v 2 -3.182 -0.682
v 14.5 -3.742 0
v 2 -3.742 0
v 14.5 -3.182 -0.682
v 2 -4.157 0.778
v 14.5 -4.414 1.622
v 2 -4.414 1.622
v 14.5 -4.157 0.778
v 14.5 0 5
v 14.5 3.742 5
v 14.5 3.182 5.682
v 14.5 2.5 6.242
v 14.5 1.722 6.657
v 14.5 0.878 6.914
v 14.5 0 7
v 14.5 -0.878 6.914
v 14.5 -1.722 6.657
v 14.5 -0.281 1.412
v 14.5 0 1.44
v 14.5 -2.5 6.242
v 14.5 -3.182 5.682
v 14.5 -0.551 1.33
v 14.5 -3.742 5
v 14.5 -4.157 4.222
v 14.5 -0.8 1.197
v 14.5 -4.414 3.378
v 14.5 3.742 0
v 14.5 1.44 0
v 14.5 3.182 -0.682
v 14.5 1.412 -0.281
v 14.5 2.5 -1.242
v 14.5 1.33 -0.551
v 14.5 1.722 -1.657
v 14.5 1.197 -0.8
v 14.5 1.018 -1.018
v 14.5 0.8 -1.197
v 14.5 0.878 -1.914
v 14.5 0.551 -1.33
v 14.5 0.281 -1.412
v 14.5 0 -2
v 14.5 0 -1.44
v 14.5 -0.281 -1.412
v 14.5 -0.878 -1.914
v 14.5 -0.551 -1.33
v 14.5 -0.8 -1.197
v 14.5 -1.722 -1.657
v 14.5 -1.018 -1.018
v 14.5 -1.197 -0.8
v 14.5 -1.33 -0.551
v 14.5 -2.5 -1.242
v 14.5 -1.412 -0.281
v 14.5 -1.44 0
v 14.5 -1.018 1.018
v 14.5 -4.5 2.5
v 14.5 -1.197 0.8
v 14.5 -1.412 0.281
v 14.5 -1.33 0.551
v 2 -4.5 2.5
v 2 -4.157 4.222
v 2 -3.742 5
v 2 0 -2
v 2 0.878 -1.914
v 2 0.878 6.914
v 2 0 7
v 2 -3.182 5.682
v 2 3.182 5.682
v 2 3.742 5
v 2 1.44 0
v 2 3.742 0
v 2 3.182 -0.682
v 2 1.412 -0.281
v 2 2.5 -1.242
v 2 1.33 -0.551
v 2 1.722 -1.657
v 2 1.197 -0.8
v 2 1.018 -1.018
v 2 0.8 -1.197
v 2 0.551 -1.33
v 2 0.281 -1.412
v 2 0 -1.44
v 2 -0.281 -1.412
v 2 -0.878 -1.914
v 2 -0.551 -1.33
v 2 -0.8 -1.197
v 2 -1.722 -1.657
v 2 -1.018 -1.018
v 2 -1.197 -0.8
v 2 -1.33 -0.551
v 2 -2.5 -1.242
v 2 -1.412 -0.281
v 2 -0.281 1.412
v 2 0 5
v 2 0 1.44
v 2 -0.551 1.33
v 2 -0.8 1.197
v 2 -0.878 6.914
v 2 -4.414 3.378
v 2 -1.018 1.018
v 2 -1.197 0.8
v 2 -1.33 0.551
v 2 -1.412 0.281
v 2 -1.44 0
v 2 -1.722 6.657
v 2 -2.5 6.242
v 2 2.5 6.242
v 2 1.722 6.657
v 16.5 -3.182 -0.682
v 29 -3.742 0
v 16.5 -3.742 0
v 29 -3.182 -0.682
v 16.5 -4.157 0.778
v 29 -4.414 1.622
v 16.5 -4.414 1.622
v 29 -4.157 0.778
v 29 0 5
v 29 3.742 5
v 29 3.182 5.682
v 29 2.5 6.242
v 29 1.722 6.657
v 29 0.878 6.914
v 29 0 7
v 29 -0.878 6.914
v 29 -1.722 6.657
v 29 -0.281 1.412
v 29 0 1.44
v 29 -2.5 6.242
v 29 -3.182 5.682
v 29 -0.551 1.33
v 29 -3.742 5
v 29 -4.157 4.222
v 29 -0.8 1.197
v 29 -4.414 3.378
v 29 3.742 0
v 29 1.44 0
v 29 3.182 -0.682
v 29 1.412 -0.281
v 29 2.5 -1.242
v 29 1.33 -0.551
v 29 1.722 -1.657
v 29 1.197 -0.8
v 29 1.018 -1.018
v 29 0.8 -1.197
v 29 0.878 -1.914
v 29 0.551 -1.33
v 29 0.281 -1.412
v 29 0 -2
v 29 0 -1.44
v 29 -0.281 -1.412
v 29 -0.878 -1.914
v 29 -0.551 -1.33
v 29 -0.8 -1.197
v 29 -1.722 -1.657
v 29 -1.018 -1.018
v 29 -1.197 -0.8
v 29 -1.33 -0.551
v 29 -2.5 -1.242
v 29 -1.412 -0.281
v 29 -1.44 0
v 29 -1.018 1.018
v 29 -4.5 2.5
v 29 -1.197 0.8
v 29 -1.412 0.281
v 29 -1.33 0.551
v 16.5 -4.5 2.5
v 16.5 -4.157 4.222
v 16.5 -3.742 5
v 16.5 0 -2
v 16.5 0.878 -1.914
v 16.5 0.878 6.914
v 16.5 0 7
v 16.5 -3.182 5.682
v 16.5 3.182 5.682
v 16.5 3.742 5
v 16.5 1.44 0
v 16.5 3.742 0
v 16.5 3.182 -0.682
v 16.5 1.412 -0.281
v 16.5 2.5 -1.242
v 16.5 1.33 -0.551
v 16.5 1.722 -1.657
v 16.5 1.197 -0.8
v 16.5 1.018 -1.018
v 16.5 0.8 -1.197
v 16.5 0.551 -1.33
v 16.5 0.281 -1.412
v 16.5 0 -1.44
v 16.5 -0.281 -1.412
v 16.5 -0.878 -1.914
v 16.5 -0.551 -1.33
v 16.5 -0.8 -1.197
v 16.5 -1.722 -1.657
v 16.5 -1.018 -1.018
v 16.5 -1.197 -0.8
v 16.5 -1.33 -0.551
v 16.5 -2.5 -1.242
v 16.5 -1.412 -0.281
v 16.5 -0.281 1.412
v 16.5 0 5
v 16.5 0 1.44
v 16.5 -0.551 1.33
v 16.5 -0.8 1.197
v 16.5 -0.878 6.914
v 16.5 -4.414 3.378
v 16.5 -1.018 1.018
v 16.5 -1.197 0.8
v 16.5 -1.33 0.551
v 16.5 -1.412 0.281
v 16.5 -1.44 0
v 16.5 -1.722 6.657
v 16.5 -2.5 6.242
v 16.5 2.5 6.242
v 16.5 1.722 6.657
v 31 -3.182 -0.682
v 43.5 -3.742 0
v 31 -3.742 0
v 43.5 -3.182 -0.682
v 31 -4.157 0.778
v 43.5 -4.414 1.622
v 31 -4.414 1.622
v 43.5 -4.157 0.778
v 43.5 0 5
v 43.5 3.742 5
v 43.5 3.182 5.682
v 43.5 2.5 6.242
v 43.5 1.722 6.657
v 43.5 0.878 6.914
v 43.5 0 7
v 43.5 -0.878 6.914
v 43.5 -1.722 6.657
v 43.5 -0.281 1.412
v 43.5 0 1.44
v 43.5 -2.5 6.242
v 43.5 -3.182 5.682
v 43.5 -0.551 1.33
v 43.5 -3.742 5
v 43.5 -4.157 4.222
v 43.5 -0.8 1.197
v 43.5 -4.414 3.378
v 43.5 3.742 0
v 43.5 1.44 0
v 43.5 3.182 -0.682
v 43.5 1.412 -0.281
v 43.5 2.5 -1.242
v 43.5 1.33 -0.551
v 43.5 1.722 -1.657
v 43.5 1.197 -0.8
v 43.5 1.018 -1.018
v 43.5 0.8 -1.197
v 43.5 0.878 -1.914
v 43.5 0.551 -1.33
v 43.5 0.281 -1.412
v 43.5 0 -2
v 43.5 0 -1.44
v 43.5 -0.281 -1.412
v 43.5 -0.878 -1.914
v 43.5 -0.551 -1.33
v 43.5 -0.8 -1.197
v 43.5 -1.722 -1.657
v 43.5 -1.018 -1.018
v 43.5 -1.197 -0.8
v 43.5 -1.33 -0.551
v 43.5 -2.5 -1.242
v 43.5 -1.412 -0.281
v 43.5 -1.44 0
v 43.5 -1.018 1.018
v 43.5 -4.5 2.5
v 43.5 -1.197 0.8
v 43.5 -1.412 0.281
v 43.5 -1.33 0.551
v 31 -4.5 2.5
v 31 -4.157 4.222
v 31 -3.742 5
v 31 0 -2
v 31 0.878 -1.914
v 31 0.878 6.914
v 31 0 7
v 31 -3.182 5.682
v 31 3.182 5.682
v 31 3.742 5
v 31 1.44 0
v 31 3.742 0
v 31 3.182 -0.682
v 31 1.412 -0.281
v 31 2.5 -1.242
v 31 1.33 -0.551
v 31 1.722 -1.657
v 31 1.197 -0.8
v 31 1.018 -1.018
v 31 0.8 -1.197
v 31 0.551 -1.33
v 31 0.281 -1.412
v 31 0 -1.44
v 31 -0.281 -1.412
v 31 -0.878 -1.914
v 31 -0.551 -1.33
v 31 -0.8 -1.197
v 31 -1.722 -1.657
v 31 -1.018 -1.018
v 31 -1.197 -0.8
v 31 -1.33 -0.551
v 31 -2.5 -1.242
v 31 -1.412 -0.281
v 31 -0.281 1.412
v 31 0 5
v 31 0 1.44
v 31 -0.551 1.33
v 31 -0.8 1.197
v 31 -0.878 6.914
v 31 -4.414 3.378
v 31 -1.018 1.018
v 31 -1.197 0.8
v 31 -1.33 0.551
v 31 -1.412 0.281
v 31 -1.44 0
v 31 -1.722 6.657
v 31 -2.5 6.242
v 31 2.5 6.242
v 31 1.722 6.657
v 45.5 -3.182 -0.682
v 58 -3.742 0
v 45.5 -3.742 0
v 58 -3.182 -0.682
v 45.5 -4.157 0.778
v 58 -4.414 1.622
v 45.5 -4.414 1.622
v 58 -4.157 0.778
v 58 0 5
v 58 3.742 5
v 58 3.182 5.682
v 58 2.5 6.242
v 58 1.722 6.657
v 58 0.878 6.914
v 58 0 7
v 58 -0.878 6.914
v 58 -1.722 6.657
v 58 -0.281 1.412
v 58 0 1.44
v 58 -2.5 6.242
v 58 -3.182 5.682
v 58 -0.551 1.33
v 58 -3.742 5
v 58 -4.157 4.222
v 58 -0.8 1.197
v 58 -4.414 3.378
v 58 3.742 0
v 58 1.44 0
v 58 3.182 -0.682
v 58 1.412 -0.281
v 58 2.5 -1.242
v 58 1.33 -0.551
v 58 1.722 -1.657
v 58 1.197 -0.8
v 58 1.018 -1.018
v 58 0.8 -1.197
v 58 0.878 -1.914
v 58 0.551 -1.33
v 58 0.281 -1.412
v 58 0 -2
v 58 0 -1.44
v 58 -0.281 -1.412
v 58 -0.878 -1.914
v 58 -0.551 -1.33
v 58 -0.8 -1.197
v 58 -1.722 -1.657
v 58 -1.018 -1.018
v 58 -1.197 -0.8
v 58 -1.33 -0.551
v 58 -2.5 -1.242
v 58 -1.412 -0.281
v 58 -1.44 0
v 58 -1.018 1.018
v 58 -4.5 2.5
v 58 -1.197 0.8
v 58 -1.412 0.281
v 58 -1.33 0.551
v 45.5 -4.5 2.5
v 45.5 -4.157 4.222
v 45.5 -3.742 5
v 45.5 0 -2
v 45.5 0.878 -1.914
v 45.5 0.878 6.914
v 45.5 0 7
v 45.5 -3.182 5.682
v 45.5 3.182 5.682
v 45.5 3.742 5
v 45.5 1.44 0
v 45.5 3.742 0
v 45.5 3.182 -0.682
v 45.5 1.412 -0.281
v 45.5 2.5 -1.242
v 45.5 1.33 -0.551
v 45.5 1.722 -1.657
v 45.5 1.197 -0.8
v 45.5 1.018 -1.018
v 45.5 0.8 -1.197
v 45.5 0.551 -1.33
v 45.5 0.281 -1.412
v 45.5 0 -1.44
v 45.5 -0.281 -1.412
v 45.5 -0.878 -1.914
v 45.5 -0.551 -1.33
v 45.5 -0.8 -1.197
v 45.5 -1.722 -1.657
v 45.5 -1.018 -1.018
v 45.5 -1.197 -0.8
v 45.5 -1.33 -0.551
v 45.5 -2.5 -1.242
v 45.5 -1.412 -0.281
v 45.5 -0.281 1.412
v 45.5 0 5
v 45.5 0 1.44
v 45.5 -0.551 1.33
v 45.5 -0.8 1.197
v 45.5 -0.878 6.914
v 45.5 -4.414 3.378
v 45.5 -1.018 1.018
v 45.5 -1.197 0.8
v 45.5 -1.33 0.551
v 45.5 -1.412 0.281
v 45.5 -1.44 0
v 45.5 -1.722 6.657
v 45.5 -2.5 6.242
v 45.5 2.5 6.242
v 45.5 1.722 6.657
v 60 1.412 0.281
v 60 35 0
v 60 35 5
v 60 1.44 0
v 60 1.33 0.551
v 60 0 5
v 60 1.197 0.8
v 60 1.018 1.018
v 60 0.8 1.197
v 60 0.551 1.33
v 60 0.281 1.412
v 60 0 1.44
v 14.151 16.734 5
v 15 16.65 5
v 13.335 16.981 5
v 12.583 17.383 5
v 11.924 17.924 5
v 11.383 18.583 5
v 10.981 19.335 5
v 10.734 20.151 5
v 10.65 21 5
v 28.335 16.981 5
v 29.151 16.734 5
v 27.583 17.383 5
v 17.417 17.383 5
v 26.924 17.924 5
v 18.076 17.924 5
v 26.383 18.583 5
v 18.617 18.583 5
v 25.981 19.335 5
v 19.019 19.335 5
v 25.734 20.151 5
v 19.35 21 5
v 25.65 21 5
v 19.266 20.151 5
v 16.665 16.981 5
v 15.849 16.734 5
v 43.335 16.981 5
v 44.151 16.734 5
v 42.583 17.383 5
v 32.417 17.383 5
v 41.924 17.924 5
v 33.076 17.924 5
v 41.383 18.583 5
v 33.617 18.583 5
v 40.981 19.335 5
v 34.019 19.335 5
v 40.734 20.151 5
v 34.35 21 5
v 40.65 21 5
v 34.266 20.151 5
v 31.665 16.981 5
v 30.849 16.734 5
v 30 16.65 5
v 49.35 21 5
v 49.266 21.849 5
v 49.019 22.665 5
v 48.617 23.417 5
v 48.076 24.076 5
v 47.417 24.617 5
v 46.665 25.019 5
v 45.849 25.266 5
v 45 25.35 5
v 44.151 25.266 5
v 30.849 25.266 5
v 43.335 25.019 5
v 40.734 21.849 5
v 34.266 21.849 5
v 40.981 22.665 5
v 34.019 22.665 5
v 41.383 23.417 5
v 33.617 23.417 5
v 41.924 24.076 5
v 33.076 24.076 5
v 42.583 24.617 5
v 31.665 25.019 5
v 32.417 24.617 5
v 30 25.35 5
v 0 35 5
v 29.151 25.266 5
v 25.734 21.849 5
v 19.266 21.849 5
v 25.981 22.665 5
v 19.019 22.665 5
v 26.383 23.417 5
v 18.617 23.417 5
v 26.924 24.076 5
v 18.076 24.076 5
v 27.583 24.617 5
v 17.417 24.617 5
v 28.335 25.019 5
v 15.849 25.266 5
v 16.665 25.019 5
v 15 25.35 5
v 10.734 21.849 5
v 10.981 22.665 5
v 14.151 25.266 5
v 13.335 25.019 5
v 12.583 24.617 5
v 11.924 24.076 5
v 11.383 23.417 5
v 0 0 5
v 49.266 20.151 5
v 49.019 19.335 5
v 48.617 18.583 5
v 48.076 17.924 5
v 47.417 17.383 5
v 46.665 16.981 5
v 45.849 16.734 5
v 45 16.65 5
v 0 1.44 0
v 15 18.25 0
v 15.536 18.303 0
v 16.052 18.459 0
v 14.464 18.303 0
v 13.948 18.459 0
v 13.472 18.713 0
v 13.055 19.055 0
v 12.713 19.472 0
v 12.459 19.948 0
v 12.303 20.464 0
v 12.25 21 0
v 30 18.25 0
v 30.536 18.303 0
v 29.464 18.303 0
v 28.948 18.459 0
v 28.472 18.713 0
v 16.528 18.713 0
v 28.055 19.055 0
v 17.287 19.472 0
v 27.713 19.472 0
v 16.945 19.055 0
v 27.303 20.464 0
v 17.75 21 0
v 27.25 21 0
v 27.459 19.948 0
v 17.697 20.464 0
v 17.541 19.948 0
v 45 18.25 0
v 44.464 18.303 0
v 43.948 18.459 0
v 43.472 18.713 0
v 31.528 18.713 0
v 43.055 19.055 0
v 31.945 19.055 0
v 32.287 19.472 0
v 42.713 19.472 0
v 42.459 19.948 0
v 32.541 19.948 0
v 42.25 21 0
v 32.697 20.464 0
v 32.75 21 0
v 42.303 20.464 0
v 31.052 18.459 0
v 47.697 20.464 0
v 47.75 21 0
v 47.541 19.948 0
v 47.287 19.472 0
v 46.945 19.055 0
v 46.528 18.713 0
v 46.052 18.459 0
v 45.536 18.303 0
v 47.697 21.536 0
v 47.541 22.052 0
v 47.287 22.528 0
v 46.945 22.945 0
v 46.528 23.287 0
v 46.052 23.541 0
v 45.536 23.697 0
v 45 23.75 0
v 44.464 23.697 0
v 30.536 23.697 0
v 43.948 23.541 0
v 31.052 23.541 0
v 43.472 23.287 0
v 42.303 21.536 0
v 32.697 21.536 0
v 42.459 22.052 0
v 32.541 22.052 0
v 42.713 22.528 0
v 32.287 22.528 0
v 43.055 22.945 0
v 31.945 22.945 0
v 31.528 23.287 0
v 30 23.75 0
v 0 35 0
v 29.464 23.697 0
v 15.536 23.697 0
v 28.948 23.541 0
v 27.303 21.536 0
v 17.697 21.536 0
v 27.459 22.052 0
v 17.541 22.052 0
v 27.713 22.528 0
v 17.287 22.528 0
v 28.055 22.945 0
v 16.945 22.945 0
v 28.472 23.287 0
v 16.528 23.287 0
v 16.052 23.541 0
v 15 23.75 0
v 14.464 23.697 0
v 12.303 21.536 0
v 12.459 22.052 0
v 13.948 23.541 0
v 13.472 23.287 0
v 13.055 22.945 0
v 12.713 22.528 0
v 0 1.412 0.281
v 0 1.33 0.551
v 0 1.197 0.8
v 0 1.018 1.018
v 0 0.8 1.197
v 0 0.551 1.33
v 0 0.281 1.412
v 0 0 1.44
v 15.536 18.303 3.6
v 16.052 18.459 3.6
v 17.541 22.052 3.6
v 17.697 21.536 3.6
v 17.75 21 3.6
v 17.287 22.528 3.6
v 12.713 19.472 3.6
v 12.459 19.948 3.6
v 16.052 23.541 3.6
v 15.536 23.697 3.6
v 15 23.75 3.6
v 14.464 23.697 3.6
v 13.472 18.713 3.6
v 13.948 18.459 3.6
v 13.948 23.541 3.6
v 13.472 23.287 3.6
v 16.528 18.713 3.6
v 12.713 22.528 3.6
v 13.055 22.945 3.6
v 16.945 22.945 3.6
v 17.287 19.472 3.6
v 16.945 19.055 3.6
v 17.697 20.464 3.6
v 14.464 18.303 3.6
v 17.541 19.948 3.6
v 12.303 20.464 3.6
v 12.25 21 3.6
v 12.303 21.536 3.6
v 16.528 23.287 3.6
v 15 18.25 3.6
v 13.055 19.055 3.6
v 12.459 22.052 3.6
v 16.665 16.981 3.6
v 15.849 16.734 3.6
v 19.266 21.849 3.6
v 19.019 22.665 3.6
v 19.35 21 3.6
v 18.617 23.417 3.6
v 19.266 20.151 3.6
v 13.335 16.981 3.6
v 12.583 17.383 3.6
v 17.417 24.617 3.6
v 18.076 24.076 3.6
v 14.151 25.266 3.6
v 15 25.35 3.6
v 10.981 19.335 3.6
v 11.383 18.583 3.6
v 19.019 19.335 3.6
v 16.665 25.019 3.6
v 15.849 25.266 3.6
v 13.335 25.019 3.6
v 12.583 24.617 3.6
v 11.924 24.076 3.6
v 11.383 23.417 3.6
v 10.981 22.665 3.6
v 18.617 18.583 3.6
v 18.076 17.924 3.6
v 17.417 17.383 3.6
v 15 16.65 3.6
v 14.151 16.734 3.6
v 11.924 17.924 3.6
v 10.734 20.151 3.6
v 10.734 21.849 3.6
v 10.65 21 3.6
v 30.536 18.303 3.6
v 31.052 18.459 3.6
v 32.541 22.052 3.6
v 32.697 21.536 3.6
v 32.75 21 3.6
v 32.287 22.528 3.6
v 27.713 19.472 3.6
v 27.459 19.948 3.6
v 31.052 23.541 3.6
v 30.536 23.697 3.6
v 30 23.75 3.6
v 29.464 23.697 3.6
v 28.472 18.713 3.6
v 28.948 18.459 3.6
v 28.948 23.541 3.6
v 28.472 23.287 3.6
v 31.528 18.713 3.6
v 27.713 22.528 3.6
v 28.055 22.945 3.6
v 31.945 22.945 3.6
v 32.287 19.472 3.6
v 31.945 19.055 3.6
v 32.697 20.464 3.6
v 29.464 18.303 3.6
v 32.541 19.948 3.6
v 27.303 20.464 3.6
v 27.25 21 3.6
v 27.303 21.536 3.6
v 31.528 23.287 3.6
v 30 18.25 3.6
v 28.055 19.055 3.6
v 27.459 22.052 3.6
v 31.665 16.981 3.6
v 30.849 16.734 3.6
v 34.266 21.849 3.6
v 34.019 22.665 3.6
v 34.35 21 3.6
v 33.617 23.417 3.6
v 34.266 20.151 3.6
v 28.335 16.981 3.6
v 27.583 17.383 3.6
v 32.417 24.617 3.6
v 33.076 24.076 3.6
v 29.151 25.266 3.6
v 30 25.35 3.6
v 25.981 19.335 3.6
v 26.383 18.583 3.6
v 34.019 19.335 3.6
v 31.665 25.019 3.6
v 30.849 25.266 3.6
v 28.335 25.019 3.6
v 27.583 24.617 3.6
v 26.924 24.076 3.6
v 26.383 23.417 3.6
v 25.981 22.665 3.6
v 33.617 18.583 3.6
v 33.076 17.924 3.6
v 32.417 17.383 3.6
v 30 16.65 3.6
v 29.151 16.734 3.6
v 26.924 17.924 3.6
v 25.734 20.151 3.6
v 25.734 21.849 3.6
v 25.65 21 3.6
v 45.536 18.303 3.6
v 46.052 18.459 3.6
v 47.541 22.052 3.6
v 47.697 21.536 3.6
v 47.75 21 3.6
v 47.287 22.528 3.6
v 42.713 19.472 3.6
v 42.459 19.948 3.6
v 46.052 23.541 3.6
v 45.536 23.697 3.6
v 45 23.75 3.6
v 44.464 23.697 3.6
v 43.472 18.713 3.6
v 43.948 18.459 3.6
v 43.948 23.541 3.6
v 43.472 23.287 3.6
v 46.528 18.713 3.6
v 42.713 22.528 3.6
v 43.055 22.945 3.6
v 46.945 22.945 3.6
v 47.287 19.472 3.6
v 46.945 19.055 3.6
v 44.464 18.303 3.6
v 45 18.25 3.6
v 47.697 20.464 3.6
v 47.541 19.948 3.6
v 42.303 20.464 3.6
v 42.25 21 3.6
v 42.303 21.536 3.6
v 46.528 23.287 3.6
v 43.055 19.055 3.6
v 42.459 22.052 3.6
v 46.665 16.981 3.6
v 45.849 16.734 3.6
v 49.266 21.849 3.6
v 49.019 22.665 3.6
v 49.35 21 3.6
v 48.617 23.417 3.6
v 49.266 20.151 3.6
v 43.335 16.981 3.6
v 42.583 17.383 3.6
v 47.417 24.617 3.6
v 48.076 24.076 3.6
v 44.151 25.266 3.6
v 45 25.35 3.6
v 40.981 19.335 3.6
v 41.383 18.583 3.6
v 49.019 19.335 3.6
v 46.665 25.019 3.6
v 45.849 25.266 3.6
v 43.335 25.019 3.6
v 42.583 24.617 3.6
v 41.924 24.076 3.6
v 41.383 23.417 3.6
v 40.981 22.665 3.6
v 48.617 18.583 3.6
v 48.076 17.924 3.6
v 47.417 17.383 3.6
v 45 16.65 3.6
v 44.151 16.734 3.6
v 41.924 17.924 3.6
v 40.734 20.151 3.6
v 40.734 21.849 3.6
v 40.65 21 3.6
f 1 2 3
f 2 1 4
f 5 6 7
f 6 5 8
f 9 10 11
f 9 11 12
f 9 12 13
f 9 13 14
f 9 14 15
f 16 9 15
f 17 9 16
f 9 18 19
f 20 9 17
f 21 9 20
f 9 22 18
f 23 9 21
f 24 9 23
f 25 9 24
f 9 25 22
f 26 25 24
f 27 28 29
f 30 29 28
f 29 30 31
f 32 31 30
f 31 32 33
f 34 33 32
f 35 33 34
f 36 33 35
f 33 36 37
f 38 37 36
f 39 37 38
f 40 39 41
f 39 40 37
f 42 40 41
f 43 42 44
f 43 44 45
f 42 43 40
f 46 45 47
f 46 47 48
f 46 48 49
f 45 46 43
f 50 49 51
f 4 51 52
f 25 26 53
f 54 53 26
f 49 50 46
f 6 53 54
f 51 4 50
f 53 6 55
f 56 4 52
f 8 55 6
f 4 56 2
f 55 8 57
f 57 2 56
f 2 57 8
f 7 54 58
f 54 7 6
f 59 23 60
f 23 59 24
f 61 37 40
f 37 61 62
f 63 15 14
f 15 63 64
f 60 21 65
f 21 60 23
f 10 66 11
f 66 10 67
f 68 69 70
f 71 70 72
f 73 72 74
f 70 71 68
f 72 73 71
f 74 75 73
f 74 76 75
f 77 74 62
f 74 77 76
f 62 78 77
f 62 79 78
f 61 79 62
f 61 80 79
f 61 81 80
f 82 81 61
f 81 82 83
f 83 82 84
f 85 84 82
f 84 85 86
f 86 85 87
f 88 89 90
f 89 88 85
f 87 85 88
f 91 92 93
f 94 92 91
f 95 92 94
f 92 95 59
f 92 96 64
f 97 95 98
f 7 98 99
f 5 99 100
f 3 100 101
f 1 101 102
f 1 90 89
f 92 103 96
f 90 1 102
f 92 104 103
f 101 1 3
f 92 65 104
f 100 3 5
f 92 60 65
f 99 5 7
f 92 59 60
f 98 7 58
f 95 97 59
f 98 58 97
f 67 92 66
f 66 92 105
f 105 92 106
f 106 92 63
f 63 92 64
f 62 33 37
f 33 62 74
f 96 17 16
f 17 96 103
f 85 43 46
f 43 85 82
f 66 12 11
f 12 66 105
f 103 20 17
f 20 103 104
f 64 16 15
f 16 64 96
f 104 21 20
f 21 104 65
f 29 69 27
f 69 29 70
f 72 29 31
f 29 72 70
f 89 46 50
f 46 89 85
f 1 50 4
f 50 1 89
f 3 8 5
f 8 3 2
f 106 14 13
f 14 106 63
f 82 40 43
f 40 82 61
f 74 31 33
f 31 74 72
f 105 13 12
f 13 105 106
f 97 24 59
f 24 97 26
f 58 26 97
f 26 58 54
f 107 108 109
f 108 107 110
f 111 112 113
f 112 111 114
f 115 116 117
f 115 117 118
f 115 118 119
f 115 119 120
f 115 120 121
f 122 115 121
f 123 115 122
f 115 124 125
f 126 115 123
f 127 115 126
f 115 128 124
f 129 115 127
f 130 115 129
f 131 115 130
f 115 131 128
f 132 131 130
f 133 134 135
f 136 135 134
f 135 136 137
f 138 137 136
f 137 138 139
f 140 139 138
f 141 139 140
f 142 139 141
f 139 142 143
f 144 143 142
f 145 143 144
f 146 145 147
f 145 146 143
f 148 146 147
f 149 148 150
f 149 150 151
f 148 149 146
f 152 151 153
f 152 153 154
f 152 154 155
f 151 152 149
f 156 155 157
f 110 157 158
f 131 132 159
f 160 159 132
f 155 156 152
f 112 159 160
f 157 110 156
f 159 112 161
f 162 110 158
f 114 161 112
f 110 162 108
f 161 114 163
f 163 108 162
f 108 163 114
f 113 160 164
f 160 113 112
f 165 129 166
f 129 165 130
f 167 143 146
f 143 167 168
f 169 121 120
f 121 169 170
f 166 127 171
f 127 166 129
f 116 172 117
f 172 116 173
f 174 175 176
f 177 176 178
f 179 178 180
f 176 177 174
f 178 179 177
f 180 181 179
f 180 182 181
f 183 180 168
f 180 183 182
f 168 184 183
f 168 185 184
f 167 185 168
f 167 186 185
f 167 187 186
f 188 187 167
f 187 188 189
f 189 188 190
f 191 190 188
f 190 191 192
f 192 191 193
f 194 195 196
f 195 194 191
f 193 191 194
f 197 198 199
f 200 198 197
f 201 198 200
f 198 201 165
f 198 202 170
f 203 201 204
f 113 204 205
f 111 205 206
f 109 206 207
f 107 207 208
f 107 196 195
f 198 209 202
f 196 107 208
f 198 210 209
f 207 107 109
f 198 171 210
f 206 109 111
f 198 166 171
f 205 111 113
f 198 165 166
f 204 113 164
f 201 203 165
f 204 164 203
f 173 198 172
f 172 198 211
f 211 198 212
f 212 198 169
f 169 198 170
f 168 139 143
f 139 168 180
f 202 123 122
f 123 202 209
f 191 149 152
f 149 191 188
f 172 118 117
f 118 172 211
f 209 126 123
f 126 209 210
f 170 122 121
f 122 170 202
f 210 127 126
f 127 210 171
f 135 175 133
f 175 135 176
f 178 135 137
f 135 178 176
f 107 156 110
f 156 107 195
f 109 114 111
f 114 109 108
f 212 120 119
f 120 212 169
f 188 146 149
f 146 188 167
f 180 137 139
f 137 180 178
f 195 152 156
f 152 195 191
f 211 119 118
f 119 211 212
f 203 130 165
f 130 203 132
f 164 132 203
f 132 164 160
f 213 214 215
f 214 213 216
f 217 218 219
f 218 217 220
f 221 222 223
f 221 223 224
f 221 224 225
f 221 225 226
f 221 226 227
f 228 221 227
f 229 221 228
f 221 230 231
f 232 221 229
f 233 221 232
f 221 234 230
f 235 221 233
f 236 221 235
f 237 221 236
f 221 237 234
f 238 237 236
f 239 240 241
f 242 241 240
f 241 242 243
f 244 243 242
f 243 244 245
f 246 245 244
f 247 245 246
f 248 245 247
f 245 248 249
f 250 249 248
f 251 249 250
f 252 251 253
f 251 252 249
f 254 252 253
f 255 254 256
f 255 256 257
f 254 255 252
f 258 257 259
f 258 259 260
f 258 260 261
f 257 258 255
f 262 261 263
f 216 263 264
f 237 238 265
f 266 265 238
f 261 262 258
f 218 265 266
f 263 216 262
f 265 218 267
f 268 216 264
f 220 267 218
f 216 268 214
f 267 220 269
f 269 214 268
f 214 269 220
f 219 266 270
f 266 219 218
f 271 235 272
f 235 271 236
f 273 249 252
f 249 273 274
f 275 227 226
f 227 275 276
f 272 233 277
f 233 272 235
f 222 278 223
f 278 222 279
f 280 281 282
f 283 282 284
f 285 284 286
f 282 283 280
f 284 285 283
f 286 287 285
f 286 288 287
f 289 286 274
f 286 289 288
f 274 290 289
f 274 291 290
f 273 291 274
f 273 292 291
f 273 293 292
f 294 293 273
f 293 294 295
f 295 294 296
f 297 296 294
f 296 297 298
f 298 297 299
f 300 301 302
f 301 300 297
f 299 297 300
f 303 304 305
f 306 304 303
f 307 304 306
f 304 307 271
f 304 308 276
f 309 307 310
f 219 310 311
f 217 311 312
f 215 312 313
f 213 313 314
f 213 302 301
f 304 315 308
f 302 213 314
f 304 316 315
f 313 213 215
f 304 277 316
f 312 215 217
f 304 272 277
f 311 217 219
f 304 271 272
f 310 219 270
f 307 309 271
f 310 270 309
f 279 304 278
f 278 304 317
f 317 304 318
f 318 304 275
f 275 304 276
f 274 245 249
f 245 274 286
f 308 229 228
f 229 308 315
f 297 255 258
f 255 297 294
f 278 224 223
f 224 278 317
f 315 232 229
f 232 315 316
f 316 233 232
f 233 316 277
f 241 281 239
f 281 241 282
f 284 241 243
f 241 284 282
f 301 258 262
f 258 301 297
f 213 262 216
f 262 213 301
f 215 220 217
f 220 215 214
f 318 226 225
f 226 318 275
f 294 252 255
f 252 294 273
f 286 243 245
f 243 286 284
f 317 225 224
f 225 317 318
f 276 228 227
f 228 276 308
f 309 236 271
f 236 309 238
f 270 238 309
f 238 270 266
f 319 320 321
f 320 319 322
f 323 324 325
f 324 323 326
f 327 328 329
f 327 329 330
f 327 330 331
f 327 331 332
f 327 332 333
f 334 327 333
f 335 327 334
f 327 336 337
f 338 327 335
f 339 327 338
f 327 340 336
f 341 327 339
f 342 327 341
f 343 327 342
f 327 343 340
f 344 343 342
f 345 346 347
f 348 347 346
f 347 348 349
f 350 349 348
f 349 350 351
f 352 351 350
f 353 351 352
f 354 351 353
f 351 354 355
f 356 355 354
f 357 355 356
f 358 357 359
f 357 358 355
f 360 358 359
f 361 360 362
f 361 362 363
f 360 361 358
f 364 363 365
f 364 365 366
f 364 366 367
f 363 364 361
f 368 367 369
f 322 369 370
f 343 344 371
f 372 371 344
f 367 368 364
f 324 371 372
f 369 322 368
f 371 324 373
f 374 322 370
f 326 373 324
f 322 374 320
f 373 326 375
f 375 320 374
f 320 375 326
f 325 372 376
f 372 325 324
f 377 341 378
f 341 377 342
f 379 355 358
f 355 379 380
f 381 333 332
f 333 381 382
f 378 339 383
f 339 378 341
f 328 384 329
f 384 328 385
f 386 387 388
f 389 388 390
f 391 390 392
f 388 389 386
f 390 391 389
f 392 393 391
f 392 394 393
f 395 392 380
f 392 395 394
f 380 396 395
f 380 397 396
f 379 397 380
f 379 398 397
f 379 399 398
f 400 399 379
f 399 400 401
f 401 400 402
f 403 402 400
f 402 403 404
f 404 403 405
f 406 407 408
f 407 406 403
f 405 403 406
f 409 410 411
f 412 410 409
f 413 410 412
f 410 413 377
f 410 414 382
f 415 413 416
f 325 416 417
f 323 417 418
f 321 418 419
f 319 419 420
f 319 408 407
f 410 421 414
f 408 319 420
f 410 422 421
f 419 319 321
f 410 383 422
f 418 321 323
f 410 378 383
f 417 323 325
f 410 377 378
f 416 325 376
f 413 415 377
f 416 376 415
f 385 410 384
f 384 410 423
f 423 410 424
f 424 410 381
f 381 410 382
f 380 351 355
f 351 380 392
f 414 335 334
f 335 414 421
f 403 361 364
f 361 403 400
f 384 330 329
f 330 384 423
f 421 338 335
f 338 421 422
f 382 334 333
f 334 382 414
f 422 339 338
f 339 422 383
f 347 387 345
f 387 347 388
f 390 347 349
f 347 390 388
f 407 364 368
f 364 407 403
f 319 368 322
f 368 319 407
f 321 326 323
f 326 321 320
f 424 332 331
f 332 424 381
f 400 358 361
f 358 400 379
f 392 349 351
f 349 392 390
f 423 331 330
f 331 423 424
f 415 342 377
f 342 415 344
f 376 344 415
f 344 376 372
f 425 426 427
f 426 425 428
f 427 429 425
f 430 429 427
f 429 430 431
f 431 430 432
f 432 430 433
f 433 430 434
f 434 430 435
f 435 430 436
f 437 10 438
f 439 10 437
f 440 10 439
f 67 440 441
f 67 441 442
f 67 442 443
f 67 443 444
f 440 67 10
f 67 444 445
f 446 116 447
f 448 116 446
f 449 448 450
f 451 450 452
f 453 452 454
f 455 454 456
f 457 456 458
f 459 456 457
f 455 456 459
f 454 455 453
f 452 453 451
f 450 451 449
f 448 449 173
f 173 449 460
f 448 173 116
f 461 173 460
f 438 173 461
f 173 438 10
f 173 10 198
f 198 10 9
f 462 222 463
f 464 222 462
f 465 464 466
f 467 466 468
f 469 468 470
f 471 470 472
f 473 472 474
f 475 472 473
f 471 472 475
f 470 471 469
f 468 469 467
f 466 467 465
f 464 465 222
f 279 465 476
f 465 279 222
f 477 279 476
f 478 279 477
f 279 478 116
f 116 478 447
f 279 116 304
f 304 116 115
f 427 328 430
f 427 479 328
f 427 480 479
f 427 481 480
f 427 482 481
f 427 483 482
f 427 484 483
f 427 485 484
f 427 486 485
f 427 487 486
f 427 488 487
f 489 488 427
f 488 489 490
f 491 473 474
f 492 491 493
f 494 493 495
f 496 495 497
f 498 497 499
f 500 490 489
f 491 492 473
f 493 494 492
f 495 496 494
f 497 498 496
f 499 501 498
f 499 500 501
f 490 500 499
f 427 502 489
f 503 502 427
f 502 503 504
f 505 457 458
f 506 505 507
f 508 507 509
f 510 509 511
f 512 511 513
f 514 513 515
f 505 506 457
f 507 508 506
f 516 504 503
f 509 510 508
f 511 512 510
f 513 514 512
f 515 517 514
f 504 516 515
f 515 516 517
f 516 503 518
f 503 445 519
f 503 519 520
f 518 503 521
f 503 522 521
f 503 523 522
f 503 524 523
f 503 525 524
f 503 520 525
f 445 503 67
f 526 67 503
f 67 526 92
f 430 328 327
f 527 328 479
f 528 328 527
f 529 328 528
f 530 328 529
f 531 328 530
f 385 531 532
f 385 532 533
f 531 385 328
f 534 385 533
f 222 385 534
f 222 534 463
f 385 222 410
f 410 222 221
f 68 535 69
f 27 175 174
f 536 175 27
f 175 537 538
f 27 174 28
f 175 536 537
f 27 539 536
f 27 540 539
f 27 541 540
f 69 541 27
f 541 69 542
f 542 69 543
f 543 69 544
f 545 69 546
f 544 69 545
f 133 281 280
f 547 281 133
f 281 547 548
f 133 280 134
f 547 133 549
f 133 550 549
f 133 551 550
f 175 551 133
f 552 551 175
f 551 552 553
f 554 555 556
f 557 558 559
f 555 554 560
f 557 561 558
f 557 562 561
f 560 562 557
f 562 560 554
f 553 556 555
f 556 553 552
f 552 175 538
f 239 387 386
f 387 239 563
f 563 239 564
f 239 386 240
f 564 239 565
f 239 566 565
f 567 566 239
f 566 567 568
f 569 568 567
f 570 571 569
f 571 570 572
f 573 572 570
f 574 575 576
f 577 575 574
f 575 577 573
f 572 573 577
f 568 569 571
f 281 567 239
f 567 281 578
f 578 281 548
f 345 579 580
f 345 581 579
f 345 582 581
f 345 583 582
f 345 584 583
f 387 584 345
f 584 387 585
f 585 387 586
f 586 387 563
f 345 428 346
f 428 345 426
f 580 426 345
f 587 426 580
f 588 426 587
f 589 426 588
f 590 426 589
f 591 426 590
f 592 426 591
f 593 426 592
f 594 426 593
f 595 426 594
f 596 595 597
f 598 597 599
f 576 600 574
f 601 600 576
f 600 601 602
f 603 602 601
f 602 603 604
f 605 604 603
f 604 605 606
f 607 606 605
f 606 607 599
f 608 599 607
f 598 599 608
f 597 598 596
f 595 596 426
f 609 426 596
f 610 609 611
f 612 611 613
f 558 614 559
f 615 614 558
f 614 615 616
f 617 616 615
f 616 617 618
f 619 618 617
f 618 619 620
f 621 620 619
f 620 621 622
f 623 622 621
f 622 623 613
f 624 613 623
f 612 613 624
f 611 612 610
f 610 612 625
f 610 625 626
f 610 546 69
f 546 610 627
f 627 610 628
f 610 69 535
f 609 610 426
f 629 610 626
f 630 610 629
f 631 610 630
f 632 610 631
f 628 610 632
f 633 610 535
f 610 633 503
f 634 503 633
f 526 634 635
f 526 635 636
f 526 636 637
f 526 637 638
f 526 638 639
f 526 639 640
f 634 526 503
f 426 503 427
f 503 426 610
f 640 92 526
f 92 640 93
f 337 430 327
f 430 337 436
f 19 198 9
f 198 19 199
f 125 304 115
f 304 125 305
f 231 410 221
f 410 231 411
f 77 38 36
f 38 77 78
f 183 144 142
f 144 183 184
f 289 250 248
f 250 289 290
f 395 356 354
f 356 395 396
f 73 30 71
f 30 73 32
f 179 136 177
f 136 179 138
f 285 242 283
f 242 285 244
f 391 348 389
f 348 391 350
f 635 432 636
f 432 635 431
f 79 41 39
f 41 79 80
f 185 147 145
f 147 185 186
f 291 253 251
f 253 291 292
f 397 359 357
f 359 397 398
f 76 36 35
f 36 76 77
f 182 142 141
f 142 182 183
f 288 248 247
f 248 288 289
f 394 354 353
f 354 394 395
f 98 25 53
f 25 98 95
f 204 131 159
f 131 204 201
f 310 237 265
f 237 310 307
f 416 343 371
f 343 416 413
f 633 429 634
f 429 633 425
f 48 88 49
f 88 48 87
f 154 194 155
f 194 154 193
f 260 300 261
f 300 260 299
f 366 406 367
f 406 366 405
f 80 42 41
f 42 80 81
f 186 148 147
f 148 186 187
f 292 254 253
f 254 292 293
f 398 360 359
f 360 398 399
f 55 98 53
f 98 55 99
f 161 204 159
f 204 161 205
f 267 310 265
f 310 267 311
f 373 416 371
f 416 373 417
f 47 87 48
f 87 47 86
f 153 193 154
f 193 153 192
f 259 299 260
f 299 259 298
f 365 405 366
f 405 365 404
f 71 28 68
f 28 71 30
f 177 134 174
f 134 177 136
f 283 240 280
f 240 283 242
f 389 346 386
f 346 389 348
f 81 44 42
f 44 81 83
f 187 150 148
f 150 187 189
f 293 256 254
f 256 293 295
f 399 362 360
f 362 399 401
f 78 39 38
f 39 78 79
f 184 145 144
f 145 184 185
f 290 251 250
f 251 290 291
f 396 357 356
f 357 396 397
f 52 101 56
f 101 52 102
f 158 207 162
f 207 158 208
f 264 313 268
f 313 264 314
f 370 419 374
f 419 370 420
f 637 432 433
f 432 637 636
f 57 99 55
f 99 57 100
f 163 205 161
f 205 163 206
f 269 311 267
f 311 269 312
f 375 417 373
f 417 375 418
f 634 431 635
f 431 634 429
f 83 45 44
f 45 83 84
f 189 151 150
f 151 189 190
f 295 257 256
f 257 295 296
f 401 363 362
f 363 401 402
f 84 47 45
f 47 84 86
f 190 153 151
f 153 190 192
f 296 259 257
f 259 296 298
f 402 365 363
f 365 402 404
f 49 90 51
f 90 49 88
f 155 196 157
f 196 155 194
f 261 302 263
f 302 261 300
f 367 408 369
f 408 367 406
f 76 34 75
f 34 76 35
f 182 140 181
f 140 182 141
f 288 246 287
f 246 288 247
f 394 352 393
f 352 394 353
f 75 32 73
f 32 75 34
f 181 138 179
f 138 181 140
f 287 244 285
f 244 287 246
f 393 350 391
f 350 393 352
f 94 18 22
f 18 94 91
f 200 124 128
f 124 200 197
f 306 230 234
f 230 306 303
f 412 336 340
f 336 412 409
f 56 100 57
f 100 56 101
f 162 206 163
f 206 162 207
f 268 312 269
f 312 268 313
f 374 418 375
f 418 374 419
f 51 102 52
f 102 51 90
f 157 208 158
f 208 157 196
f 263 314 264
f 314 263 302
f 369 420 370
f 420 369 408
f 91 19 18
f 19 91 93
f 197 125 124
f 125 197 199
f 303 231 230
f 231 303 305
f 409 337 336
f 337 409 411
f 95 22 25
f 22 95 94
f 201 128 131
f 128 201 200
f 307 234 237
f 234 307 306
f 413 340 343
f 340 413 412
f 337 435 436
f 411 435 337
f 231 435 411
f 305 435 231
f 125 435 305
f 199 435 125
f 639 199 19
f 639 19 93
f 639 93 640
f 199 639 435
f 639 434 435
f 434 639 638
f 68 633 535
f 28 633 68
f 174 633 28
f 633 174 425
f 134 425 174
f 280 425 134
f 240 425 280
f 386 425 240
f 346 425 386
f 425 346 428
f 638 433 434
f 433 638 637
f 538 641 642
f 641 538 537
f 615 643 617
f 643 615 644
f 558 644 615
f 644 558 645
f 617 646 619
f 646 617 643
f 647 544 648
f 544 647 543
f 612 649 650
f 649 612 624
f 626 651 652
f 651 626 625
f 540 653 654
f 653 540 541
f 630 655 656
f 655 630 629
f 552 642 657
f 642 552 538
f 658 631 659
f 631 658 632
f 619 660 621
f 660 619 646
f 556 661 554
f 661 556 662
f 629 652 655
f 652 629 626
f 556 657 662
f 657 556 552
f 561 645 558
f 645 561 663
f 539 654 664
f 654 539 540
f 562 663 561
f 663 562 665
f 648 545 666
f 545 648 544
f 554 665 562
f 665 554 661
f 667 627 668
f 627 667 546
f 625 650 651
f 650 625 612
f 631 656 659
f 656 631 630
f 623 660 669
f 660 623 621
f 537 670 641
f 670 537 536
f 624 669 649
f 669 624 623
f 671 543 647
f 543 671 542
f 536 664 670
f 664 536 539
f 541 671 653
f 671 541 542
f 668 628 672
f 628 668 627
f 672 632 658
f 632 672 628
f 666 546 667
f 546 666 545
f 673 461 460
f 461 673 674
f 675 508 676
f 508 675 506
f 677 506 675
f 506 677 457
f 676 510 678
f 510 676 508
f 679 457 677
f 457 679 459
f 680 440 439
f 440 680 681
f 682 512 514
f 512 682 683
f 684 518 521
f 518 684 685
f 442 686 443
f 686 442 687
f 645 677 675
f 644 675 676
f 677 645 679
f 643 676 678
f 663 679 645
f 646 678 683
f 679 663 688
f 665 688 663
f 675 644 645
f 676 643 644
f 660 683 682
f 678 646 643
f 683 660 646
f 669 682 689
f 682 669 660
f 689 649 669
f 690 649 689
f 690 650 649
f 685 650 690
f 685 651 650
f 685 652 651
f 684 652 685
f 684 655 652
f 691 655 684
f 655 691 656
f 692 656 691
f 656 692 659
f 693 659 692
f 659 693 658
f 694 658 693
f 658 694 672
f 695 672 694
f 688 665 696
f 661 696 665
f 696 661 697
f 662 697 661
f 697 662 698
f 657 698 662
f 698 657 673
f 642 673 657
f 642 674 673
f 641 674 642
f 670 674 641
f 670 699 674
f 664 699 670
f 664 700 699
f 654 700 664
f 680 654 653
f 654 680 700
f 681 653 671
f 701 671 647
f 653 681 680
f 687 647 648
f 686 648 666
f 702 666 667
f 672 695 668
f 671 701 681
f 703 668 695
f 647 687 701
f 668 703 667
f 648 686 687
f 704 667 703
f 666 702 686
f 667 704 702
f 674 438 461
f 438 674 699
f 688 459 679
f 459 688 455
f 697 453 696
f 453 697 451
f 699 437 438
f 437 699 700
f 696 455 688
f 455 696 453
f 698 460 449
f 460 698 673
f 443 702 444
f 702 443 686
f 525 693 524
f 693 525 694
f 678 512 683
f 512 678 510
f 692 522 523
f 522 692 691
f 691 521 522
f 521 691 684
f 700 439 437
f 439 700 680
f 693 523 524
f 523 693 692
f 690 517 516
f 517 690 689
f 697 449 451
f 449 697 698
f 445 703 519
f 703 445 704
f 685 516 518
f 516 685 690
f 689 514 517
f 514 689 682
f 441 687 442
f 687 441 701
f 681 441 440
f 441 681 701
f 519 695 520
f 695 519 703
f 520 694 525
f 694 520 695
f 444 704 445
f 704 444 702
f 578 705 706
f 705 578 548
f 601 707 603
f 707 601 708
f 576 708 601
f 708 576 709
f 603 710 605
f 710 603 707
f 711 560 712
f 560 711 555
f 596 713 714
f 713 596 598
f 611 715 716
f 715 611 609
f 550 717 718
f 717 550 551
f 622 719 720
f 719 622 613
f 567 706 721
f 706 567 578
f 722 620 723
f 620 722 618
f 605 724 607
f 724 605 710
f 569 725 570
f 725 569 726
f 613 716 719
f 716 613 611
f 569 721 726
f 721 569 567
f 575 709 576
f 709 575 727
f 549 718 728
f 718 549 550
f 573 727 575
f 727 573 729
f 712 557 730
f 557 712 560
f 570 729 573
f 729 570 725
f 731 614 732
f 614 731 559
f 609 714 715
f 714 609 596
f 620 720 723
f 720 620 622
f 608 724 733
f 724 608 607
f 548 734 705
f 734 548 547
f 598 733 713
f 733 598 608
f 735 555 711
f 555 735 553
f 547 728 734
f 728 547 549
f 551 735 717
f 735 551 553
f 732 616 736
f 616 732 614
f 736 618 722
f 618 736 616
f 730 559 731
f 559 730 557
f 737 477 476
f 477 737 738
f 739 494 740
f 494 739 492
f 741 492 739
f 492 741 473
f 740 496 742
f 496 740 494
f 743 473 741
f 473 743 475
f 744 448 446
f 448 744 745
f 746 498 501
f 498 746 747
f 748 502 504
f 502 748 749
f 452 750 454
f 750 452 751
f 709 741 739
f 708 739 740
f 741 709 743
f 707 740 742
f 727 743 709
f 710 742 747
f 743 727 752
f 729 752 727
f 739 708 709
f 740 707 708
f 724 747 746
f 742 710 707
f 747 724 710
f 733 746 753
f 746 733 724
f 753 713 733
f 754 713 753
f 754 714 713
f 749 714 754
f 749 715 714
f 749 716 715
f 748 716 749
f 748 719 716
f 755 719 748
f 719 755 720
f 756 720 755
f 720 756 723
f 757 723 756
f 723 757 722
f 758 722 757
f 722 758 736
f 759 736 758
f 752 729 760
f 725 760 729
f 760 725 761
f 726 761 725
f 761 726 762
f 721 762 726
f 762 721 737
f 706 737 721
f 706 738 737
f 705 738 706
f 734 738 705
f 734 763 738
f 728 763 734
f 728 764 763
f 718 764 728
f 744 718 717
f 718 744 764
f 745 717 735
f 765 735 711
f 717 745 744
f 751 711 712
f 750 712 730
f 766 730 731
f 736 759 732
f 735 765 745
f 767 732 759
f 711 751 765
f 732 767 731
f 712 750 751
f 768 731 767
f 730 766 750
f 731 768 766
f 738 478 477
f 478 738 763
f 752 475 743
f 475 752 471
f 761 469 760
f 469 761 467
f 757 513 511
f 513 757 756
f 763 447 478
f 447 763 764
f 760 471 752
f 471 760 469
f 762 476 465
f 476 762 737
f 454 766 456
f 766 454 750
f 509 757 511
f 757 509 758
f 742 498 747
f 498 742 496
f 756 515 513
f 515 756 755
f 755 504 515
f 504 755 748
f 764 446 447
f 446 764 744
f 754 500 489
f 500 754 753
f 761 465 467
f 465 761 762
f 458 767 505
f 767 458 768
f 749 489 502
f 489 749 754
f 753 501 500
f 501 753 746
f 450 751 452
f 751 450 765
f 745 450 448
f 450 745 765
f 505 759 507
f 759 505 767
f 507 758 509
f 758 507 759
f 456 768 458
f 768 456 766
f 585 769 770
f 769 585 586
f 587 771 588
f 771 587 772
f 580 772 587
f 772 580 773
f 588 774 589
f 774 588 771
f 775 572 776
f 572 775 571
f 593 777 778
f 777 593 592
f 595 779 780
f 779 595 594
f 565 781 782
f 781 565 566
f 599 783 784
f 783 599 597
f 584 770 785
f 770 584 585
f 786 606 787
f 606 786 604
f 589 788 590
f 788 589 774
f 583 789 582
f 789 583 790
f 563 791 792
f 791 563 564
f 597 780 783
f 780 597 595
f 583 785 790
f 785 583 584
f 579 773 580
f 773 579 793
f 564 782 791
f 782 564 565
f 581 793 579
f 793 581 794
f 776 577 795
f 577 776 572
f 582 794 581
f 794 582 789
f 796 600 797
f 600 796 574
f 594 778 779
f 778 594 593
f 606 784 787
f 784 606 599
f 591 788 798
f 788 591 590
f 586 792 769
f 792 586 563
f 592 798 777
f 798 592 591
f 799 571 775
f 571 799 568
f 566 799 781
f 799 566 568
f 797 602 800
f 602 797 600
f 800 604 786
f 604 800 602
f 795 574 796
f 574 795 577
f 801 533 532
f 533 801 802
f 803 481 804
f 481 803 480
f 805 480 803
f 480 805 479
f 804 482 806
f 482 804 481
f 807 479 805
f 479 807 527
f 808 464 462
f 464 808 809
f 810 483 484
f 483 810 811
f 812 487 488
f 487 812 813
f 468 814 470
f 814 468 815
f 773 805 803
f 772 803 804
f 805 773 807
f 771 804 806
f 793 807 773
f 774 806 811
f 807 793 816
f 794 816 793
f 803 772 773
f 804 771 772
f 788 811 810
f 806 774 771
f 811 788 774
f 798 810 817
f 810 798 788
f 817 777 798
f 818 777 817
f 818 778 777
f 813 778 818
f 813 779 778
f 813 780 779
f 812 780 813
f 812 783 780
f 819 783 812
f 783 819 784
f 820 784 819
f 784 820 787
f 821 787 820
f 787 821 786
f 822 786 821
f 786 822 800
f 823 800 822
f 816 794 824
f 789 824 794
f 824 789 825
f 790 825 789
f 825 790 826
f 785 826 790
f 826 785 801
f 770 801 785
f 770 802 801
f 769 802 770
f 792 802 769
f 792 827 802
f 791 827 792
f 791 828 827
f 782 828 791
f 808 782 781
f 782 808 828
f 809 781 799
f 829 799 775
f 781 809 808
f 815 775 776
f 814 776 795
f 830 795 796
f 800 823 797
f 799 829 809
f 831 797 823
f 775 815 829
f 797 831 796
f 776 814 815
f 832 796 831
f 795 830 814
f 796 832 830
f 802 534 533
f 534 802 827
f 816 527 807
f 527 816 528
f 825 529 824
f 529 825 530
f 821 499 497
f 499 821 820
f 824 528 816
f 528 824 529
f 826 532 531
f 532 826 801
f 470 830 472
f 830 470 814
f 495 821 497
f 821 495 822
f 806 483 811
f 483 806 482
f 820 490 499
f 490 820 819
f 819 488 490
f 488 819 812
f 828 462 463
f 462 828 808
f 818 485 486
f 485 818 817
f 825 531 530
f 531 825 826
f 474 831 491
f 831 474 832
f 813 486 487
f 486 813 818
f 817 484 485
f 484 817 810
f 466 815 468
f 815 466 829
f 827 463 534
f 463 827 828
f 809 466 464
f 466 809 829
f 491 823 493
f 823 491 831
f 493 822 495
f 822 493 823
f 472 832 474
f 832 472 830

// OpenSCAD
$fn = 32;

// ----------------------------------------------------------------------
// Hinge leaf: 60 x 39.5 x 9 mm
// ----------------------------------------------------------------------

// --- parameters (mm) ---
leaf_len = 60;            // leaf length, X
leaf_w = 35;              // leaf width, Y
leaf_t = 5;               // leaf thickness
knuckle_d = 9;            // knuckle diameter
knuckle_w = 12.5;         // knuckle width
knuckle_n = 4;            // number of knuckles
pin_d = 2.88;             // pin bore
gap = 2;                  // gap between the knuckles
screw_d = 5.5;            // screw clearance
cs_d = 8.7;               // countersink diameter
cs_h = 1.4;               // countersink depth

module leaf() {
  cube([leaf_len, leaf_w, leaf_t]);
}

module knuckles() {
  /* barrels sit on the leaf edge, the pin axis at half the leaf thickness */
  for (i = [0 : knuckle_n - 1])
    translate([gap + i * (knuckle_w + gap), 0, leaf_t * 0.5])
      rotate([0, 90, 0]) cylinder(h = knuckle_w, d = knuckle_d);
}

difference() {
  union() {
    leaf();
    knuckles();
  }
  rotate([0, 90, 0]) translate([0, 0, -1])
    cylinder(h = leaf_len + 2, d = pin_d);
  translate([15, leaf_w * 0.6, -1]) cylinder(h = leaf_t + 2, d = screw_d);
  translate([15, leaf_w * 0.6, leaf_t - cs_h]) cylinder(h = cs_h + 0.5, d = cs_d);
  translate([30, leaf_w * 0.6, -1]) cylinder(h = leaf_t + 2, d = screw_d);
  translate([30, leaf_w * 0.6, leaf_t - cs_h]) cylinder(h = cs_h + 0.5, d = cs_d);
  translate([45, leaf_w * 0.6, -1]) cylinder(h = leaf_t + 2, d = screw_d);
  translate([45, leaf_w * 0.6, leaf_t - cs_h]) cylinder(h = cs_h + 0.5, d = cs_d);
}
